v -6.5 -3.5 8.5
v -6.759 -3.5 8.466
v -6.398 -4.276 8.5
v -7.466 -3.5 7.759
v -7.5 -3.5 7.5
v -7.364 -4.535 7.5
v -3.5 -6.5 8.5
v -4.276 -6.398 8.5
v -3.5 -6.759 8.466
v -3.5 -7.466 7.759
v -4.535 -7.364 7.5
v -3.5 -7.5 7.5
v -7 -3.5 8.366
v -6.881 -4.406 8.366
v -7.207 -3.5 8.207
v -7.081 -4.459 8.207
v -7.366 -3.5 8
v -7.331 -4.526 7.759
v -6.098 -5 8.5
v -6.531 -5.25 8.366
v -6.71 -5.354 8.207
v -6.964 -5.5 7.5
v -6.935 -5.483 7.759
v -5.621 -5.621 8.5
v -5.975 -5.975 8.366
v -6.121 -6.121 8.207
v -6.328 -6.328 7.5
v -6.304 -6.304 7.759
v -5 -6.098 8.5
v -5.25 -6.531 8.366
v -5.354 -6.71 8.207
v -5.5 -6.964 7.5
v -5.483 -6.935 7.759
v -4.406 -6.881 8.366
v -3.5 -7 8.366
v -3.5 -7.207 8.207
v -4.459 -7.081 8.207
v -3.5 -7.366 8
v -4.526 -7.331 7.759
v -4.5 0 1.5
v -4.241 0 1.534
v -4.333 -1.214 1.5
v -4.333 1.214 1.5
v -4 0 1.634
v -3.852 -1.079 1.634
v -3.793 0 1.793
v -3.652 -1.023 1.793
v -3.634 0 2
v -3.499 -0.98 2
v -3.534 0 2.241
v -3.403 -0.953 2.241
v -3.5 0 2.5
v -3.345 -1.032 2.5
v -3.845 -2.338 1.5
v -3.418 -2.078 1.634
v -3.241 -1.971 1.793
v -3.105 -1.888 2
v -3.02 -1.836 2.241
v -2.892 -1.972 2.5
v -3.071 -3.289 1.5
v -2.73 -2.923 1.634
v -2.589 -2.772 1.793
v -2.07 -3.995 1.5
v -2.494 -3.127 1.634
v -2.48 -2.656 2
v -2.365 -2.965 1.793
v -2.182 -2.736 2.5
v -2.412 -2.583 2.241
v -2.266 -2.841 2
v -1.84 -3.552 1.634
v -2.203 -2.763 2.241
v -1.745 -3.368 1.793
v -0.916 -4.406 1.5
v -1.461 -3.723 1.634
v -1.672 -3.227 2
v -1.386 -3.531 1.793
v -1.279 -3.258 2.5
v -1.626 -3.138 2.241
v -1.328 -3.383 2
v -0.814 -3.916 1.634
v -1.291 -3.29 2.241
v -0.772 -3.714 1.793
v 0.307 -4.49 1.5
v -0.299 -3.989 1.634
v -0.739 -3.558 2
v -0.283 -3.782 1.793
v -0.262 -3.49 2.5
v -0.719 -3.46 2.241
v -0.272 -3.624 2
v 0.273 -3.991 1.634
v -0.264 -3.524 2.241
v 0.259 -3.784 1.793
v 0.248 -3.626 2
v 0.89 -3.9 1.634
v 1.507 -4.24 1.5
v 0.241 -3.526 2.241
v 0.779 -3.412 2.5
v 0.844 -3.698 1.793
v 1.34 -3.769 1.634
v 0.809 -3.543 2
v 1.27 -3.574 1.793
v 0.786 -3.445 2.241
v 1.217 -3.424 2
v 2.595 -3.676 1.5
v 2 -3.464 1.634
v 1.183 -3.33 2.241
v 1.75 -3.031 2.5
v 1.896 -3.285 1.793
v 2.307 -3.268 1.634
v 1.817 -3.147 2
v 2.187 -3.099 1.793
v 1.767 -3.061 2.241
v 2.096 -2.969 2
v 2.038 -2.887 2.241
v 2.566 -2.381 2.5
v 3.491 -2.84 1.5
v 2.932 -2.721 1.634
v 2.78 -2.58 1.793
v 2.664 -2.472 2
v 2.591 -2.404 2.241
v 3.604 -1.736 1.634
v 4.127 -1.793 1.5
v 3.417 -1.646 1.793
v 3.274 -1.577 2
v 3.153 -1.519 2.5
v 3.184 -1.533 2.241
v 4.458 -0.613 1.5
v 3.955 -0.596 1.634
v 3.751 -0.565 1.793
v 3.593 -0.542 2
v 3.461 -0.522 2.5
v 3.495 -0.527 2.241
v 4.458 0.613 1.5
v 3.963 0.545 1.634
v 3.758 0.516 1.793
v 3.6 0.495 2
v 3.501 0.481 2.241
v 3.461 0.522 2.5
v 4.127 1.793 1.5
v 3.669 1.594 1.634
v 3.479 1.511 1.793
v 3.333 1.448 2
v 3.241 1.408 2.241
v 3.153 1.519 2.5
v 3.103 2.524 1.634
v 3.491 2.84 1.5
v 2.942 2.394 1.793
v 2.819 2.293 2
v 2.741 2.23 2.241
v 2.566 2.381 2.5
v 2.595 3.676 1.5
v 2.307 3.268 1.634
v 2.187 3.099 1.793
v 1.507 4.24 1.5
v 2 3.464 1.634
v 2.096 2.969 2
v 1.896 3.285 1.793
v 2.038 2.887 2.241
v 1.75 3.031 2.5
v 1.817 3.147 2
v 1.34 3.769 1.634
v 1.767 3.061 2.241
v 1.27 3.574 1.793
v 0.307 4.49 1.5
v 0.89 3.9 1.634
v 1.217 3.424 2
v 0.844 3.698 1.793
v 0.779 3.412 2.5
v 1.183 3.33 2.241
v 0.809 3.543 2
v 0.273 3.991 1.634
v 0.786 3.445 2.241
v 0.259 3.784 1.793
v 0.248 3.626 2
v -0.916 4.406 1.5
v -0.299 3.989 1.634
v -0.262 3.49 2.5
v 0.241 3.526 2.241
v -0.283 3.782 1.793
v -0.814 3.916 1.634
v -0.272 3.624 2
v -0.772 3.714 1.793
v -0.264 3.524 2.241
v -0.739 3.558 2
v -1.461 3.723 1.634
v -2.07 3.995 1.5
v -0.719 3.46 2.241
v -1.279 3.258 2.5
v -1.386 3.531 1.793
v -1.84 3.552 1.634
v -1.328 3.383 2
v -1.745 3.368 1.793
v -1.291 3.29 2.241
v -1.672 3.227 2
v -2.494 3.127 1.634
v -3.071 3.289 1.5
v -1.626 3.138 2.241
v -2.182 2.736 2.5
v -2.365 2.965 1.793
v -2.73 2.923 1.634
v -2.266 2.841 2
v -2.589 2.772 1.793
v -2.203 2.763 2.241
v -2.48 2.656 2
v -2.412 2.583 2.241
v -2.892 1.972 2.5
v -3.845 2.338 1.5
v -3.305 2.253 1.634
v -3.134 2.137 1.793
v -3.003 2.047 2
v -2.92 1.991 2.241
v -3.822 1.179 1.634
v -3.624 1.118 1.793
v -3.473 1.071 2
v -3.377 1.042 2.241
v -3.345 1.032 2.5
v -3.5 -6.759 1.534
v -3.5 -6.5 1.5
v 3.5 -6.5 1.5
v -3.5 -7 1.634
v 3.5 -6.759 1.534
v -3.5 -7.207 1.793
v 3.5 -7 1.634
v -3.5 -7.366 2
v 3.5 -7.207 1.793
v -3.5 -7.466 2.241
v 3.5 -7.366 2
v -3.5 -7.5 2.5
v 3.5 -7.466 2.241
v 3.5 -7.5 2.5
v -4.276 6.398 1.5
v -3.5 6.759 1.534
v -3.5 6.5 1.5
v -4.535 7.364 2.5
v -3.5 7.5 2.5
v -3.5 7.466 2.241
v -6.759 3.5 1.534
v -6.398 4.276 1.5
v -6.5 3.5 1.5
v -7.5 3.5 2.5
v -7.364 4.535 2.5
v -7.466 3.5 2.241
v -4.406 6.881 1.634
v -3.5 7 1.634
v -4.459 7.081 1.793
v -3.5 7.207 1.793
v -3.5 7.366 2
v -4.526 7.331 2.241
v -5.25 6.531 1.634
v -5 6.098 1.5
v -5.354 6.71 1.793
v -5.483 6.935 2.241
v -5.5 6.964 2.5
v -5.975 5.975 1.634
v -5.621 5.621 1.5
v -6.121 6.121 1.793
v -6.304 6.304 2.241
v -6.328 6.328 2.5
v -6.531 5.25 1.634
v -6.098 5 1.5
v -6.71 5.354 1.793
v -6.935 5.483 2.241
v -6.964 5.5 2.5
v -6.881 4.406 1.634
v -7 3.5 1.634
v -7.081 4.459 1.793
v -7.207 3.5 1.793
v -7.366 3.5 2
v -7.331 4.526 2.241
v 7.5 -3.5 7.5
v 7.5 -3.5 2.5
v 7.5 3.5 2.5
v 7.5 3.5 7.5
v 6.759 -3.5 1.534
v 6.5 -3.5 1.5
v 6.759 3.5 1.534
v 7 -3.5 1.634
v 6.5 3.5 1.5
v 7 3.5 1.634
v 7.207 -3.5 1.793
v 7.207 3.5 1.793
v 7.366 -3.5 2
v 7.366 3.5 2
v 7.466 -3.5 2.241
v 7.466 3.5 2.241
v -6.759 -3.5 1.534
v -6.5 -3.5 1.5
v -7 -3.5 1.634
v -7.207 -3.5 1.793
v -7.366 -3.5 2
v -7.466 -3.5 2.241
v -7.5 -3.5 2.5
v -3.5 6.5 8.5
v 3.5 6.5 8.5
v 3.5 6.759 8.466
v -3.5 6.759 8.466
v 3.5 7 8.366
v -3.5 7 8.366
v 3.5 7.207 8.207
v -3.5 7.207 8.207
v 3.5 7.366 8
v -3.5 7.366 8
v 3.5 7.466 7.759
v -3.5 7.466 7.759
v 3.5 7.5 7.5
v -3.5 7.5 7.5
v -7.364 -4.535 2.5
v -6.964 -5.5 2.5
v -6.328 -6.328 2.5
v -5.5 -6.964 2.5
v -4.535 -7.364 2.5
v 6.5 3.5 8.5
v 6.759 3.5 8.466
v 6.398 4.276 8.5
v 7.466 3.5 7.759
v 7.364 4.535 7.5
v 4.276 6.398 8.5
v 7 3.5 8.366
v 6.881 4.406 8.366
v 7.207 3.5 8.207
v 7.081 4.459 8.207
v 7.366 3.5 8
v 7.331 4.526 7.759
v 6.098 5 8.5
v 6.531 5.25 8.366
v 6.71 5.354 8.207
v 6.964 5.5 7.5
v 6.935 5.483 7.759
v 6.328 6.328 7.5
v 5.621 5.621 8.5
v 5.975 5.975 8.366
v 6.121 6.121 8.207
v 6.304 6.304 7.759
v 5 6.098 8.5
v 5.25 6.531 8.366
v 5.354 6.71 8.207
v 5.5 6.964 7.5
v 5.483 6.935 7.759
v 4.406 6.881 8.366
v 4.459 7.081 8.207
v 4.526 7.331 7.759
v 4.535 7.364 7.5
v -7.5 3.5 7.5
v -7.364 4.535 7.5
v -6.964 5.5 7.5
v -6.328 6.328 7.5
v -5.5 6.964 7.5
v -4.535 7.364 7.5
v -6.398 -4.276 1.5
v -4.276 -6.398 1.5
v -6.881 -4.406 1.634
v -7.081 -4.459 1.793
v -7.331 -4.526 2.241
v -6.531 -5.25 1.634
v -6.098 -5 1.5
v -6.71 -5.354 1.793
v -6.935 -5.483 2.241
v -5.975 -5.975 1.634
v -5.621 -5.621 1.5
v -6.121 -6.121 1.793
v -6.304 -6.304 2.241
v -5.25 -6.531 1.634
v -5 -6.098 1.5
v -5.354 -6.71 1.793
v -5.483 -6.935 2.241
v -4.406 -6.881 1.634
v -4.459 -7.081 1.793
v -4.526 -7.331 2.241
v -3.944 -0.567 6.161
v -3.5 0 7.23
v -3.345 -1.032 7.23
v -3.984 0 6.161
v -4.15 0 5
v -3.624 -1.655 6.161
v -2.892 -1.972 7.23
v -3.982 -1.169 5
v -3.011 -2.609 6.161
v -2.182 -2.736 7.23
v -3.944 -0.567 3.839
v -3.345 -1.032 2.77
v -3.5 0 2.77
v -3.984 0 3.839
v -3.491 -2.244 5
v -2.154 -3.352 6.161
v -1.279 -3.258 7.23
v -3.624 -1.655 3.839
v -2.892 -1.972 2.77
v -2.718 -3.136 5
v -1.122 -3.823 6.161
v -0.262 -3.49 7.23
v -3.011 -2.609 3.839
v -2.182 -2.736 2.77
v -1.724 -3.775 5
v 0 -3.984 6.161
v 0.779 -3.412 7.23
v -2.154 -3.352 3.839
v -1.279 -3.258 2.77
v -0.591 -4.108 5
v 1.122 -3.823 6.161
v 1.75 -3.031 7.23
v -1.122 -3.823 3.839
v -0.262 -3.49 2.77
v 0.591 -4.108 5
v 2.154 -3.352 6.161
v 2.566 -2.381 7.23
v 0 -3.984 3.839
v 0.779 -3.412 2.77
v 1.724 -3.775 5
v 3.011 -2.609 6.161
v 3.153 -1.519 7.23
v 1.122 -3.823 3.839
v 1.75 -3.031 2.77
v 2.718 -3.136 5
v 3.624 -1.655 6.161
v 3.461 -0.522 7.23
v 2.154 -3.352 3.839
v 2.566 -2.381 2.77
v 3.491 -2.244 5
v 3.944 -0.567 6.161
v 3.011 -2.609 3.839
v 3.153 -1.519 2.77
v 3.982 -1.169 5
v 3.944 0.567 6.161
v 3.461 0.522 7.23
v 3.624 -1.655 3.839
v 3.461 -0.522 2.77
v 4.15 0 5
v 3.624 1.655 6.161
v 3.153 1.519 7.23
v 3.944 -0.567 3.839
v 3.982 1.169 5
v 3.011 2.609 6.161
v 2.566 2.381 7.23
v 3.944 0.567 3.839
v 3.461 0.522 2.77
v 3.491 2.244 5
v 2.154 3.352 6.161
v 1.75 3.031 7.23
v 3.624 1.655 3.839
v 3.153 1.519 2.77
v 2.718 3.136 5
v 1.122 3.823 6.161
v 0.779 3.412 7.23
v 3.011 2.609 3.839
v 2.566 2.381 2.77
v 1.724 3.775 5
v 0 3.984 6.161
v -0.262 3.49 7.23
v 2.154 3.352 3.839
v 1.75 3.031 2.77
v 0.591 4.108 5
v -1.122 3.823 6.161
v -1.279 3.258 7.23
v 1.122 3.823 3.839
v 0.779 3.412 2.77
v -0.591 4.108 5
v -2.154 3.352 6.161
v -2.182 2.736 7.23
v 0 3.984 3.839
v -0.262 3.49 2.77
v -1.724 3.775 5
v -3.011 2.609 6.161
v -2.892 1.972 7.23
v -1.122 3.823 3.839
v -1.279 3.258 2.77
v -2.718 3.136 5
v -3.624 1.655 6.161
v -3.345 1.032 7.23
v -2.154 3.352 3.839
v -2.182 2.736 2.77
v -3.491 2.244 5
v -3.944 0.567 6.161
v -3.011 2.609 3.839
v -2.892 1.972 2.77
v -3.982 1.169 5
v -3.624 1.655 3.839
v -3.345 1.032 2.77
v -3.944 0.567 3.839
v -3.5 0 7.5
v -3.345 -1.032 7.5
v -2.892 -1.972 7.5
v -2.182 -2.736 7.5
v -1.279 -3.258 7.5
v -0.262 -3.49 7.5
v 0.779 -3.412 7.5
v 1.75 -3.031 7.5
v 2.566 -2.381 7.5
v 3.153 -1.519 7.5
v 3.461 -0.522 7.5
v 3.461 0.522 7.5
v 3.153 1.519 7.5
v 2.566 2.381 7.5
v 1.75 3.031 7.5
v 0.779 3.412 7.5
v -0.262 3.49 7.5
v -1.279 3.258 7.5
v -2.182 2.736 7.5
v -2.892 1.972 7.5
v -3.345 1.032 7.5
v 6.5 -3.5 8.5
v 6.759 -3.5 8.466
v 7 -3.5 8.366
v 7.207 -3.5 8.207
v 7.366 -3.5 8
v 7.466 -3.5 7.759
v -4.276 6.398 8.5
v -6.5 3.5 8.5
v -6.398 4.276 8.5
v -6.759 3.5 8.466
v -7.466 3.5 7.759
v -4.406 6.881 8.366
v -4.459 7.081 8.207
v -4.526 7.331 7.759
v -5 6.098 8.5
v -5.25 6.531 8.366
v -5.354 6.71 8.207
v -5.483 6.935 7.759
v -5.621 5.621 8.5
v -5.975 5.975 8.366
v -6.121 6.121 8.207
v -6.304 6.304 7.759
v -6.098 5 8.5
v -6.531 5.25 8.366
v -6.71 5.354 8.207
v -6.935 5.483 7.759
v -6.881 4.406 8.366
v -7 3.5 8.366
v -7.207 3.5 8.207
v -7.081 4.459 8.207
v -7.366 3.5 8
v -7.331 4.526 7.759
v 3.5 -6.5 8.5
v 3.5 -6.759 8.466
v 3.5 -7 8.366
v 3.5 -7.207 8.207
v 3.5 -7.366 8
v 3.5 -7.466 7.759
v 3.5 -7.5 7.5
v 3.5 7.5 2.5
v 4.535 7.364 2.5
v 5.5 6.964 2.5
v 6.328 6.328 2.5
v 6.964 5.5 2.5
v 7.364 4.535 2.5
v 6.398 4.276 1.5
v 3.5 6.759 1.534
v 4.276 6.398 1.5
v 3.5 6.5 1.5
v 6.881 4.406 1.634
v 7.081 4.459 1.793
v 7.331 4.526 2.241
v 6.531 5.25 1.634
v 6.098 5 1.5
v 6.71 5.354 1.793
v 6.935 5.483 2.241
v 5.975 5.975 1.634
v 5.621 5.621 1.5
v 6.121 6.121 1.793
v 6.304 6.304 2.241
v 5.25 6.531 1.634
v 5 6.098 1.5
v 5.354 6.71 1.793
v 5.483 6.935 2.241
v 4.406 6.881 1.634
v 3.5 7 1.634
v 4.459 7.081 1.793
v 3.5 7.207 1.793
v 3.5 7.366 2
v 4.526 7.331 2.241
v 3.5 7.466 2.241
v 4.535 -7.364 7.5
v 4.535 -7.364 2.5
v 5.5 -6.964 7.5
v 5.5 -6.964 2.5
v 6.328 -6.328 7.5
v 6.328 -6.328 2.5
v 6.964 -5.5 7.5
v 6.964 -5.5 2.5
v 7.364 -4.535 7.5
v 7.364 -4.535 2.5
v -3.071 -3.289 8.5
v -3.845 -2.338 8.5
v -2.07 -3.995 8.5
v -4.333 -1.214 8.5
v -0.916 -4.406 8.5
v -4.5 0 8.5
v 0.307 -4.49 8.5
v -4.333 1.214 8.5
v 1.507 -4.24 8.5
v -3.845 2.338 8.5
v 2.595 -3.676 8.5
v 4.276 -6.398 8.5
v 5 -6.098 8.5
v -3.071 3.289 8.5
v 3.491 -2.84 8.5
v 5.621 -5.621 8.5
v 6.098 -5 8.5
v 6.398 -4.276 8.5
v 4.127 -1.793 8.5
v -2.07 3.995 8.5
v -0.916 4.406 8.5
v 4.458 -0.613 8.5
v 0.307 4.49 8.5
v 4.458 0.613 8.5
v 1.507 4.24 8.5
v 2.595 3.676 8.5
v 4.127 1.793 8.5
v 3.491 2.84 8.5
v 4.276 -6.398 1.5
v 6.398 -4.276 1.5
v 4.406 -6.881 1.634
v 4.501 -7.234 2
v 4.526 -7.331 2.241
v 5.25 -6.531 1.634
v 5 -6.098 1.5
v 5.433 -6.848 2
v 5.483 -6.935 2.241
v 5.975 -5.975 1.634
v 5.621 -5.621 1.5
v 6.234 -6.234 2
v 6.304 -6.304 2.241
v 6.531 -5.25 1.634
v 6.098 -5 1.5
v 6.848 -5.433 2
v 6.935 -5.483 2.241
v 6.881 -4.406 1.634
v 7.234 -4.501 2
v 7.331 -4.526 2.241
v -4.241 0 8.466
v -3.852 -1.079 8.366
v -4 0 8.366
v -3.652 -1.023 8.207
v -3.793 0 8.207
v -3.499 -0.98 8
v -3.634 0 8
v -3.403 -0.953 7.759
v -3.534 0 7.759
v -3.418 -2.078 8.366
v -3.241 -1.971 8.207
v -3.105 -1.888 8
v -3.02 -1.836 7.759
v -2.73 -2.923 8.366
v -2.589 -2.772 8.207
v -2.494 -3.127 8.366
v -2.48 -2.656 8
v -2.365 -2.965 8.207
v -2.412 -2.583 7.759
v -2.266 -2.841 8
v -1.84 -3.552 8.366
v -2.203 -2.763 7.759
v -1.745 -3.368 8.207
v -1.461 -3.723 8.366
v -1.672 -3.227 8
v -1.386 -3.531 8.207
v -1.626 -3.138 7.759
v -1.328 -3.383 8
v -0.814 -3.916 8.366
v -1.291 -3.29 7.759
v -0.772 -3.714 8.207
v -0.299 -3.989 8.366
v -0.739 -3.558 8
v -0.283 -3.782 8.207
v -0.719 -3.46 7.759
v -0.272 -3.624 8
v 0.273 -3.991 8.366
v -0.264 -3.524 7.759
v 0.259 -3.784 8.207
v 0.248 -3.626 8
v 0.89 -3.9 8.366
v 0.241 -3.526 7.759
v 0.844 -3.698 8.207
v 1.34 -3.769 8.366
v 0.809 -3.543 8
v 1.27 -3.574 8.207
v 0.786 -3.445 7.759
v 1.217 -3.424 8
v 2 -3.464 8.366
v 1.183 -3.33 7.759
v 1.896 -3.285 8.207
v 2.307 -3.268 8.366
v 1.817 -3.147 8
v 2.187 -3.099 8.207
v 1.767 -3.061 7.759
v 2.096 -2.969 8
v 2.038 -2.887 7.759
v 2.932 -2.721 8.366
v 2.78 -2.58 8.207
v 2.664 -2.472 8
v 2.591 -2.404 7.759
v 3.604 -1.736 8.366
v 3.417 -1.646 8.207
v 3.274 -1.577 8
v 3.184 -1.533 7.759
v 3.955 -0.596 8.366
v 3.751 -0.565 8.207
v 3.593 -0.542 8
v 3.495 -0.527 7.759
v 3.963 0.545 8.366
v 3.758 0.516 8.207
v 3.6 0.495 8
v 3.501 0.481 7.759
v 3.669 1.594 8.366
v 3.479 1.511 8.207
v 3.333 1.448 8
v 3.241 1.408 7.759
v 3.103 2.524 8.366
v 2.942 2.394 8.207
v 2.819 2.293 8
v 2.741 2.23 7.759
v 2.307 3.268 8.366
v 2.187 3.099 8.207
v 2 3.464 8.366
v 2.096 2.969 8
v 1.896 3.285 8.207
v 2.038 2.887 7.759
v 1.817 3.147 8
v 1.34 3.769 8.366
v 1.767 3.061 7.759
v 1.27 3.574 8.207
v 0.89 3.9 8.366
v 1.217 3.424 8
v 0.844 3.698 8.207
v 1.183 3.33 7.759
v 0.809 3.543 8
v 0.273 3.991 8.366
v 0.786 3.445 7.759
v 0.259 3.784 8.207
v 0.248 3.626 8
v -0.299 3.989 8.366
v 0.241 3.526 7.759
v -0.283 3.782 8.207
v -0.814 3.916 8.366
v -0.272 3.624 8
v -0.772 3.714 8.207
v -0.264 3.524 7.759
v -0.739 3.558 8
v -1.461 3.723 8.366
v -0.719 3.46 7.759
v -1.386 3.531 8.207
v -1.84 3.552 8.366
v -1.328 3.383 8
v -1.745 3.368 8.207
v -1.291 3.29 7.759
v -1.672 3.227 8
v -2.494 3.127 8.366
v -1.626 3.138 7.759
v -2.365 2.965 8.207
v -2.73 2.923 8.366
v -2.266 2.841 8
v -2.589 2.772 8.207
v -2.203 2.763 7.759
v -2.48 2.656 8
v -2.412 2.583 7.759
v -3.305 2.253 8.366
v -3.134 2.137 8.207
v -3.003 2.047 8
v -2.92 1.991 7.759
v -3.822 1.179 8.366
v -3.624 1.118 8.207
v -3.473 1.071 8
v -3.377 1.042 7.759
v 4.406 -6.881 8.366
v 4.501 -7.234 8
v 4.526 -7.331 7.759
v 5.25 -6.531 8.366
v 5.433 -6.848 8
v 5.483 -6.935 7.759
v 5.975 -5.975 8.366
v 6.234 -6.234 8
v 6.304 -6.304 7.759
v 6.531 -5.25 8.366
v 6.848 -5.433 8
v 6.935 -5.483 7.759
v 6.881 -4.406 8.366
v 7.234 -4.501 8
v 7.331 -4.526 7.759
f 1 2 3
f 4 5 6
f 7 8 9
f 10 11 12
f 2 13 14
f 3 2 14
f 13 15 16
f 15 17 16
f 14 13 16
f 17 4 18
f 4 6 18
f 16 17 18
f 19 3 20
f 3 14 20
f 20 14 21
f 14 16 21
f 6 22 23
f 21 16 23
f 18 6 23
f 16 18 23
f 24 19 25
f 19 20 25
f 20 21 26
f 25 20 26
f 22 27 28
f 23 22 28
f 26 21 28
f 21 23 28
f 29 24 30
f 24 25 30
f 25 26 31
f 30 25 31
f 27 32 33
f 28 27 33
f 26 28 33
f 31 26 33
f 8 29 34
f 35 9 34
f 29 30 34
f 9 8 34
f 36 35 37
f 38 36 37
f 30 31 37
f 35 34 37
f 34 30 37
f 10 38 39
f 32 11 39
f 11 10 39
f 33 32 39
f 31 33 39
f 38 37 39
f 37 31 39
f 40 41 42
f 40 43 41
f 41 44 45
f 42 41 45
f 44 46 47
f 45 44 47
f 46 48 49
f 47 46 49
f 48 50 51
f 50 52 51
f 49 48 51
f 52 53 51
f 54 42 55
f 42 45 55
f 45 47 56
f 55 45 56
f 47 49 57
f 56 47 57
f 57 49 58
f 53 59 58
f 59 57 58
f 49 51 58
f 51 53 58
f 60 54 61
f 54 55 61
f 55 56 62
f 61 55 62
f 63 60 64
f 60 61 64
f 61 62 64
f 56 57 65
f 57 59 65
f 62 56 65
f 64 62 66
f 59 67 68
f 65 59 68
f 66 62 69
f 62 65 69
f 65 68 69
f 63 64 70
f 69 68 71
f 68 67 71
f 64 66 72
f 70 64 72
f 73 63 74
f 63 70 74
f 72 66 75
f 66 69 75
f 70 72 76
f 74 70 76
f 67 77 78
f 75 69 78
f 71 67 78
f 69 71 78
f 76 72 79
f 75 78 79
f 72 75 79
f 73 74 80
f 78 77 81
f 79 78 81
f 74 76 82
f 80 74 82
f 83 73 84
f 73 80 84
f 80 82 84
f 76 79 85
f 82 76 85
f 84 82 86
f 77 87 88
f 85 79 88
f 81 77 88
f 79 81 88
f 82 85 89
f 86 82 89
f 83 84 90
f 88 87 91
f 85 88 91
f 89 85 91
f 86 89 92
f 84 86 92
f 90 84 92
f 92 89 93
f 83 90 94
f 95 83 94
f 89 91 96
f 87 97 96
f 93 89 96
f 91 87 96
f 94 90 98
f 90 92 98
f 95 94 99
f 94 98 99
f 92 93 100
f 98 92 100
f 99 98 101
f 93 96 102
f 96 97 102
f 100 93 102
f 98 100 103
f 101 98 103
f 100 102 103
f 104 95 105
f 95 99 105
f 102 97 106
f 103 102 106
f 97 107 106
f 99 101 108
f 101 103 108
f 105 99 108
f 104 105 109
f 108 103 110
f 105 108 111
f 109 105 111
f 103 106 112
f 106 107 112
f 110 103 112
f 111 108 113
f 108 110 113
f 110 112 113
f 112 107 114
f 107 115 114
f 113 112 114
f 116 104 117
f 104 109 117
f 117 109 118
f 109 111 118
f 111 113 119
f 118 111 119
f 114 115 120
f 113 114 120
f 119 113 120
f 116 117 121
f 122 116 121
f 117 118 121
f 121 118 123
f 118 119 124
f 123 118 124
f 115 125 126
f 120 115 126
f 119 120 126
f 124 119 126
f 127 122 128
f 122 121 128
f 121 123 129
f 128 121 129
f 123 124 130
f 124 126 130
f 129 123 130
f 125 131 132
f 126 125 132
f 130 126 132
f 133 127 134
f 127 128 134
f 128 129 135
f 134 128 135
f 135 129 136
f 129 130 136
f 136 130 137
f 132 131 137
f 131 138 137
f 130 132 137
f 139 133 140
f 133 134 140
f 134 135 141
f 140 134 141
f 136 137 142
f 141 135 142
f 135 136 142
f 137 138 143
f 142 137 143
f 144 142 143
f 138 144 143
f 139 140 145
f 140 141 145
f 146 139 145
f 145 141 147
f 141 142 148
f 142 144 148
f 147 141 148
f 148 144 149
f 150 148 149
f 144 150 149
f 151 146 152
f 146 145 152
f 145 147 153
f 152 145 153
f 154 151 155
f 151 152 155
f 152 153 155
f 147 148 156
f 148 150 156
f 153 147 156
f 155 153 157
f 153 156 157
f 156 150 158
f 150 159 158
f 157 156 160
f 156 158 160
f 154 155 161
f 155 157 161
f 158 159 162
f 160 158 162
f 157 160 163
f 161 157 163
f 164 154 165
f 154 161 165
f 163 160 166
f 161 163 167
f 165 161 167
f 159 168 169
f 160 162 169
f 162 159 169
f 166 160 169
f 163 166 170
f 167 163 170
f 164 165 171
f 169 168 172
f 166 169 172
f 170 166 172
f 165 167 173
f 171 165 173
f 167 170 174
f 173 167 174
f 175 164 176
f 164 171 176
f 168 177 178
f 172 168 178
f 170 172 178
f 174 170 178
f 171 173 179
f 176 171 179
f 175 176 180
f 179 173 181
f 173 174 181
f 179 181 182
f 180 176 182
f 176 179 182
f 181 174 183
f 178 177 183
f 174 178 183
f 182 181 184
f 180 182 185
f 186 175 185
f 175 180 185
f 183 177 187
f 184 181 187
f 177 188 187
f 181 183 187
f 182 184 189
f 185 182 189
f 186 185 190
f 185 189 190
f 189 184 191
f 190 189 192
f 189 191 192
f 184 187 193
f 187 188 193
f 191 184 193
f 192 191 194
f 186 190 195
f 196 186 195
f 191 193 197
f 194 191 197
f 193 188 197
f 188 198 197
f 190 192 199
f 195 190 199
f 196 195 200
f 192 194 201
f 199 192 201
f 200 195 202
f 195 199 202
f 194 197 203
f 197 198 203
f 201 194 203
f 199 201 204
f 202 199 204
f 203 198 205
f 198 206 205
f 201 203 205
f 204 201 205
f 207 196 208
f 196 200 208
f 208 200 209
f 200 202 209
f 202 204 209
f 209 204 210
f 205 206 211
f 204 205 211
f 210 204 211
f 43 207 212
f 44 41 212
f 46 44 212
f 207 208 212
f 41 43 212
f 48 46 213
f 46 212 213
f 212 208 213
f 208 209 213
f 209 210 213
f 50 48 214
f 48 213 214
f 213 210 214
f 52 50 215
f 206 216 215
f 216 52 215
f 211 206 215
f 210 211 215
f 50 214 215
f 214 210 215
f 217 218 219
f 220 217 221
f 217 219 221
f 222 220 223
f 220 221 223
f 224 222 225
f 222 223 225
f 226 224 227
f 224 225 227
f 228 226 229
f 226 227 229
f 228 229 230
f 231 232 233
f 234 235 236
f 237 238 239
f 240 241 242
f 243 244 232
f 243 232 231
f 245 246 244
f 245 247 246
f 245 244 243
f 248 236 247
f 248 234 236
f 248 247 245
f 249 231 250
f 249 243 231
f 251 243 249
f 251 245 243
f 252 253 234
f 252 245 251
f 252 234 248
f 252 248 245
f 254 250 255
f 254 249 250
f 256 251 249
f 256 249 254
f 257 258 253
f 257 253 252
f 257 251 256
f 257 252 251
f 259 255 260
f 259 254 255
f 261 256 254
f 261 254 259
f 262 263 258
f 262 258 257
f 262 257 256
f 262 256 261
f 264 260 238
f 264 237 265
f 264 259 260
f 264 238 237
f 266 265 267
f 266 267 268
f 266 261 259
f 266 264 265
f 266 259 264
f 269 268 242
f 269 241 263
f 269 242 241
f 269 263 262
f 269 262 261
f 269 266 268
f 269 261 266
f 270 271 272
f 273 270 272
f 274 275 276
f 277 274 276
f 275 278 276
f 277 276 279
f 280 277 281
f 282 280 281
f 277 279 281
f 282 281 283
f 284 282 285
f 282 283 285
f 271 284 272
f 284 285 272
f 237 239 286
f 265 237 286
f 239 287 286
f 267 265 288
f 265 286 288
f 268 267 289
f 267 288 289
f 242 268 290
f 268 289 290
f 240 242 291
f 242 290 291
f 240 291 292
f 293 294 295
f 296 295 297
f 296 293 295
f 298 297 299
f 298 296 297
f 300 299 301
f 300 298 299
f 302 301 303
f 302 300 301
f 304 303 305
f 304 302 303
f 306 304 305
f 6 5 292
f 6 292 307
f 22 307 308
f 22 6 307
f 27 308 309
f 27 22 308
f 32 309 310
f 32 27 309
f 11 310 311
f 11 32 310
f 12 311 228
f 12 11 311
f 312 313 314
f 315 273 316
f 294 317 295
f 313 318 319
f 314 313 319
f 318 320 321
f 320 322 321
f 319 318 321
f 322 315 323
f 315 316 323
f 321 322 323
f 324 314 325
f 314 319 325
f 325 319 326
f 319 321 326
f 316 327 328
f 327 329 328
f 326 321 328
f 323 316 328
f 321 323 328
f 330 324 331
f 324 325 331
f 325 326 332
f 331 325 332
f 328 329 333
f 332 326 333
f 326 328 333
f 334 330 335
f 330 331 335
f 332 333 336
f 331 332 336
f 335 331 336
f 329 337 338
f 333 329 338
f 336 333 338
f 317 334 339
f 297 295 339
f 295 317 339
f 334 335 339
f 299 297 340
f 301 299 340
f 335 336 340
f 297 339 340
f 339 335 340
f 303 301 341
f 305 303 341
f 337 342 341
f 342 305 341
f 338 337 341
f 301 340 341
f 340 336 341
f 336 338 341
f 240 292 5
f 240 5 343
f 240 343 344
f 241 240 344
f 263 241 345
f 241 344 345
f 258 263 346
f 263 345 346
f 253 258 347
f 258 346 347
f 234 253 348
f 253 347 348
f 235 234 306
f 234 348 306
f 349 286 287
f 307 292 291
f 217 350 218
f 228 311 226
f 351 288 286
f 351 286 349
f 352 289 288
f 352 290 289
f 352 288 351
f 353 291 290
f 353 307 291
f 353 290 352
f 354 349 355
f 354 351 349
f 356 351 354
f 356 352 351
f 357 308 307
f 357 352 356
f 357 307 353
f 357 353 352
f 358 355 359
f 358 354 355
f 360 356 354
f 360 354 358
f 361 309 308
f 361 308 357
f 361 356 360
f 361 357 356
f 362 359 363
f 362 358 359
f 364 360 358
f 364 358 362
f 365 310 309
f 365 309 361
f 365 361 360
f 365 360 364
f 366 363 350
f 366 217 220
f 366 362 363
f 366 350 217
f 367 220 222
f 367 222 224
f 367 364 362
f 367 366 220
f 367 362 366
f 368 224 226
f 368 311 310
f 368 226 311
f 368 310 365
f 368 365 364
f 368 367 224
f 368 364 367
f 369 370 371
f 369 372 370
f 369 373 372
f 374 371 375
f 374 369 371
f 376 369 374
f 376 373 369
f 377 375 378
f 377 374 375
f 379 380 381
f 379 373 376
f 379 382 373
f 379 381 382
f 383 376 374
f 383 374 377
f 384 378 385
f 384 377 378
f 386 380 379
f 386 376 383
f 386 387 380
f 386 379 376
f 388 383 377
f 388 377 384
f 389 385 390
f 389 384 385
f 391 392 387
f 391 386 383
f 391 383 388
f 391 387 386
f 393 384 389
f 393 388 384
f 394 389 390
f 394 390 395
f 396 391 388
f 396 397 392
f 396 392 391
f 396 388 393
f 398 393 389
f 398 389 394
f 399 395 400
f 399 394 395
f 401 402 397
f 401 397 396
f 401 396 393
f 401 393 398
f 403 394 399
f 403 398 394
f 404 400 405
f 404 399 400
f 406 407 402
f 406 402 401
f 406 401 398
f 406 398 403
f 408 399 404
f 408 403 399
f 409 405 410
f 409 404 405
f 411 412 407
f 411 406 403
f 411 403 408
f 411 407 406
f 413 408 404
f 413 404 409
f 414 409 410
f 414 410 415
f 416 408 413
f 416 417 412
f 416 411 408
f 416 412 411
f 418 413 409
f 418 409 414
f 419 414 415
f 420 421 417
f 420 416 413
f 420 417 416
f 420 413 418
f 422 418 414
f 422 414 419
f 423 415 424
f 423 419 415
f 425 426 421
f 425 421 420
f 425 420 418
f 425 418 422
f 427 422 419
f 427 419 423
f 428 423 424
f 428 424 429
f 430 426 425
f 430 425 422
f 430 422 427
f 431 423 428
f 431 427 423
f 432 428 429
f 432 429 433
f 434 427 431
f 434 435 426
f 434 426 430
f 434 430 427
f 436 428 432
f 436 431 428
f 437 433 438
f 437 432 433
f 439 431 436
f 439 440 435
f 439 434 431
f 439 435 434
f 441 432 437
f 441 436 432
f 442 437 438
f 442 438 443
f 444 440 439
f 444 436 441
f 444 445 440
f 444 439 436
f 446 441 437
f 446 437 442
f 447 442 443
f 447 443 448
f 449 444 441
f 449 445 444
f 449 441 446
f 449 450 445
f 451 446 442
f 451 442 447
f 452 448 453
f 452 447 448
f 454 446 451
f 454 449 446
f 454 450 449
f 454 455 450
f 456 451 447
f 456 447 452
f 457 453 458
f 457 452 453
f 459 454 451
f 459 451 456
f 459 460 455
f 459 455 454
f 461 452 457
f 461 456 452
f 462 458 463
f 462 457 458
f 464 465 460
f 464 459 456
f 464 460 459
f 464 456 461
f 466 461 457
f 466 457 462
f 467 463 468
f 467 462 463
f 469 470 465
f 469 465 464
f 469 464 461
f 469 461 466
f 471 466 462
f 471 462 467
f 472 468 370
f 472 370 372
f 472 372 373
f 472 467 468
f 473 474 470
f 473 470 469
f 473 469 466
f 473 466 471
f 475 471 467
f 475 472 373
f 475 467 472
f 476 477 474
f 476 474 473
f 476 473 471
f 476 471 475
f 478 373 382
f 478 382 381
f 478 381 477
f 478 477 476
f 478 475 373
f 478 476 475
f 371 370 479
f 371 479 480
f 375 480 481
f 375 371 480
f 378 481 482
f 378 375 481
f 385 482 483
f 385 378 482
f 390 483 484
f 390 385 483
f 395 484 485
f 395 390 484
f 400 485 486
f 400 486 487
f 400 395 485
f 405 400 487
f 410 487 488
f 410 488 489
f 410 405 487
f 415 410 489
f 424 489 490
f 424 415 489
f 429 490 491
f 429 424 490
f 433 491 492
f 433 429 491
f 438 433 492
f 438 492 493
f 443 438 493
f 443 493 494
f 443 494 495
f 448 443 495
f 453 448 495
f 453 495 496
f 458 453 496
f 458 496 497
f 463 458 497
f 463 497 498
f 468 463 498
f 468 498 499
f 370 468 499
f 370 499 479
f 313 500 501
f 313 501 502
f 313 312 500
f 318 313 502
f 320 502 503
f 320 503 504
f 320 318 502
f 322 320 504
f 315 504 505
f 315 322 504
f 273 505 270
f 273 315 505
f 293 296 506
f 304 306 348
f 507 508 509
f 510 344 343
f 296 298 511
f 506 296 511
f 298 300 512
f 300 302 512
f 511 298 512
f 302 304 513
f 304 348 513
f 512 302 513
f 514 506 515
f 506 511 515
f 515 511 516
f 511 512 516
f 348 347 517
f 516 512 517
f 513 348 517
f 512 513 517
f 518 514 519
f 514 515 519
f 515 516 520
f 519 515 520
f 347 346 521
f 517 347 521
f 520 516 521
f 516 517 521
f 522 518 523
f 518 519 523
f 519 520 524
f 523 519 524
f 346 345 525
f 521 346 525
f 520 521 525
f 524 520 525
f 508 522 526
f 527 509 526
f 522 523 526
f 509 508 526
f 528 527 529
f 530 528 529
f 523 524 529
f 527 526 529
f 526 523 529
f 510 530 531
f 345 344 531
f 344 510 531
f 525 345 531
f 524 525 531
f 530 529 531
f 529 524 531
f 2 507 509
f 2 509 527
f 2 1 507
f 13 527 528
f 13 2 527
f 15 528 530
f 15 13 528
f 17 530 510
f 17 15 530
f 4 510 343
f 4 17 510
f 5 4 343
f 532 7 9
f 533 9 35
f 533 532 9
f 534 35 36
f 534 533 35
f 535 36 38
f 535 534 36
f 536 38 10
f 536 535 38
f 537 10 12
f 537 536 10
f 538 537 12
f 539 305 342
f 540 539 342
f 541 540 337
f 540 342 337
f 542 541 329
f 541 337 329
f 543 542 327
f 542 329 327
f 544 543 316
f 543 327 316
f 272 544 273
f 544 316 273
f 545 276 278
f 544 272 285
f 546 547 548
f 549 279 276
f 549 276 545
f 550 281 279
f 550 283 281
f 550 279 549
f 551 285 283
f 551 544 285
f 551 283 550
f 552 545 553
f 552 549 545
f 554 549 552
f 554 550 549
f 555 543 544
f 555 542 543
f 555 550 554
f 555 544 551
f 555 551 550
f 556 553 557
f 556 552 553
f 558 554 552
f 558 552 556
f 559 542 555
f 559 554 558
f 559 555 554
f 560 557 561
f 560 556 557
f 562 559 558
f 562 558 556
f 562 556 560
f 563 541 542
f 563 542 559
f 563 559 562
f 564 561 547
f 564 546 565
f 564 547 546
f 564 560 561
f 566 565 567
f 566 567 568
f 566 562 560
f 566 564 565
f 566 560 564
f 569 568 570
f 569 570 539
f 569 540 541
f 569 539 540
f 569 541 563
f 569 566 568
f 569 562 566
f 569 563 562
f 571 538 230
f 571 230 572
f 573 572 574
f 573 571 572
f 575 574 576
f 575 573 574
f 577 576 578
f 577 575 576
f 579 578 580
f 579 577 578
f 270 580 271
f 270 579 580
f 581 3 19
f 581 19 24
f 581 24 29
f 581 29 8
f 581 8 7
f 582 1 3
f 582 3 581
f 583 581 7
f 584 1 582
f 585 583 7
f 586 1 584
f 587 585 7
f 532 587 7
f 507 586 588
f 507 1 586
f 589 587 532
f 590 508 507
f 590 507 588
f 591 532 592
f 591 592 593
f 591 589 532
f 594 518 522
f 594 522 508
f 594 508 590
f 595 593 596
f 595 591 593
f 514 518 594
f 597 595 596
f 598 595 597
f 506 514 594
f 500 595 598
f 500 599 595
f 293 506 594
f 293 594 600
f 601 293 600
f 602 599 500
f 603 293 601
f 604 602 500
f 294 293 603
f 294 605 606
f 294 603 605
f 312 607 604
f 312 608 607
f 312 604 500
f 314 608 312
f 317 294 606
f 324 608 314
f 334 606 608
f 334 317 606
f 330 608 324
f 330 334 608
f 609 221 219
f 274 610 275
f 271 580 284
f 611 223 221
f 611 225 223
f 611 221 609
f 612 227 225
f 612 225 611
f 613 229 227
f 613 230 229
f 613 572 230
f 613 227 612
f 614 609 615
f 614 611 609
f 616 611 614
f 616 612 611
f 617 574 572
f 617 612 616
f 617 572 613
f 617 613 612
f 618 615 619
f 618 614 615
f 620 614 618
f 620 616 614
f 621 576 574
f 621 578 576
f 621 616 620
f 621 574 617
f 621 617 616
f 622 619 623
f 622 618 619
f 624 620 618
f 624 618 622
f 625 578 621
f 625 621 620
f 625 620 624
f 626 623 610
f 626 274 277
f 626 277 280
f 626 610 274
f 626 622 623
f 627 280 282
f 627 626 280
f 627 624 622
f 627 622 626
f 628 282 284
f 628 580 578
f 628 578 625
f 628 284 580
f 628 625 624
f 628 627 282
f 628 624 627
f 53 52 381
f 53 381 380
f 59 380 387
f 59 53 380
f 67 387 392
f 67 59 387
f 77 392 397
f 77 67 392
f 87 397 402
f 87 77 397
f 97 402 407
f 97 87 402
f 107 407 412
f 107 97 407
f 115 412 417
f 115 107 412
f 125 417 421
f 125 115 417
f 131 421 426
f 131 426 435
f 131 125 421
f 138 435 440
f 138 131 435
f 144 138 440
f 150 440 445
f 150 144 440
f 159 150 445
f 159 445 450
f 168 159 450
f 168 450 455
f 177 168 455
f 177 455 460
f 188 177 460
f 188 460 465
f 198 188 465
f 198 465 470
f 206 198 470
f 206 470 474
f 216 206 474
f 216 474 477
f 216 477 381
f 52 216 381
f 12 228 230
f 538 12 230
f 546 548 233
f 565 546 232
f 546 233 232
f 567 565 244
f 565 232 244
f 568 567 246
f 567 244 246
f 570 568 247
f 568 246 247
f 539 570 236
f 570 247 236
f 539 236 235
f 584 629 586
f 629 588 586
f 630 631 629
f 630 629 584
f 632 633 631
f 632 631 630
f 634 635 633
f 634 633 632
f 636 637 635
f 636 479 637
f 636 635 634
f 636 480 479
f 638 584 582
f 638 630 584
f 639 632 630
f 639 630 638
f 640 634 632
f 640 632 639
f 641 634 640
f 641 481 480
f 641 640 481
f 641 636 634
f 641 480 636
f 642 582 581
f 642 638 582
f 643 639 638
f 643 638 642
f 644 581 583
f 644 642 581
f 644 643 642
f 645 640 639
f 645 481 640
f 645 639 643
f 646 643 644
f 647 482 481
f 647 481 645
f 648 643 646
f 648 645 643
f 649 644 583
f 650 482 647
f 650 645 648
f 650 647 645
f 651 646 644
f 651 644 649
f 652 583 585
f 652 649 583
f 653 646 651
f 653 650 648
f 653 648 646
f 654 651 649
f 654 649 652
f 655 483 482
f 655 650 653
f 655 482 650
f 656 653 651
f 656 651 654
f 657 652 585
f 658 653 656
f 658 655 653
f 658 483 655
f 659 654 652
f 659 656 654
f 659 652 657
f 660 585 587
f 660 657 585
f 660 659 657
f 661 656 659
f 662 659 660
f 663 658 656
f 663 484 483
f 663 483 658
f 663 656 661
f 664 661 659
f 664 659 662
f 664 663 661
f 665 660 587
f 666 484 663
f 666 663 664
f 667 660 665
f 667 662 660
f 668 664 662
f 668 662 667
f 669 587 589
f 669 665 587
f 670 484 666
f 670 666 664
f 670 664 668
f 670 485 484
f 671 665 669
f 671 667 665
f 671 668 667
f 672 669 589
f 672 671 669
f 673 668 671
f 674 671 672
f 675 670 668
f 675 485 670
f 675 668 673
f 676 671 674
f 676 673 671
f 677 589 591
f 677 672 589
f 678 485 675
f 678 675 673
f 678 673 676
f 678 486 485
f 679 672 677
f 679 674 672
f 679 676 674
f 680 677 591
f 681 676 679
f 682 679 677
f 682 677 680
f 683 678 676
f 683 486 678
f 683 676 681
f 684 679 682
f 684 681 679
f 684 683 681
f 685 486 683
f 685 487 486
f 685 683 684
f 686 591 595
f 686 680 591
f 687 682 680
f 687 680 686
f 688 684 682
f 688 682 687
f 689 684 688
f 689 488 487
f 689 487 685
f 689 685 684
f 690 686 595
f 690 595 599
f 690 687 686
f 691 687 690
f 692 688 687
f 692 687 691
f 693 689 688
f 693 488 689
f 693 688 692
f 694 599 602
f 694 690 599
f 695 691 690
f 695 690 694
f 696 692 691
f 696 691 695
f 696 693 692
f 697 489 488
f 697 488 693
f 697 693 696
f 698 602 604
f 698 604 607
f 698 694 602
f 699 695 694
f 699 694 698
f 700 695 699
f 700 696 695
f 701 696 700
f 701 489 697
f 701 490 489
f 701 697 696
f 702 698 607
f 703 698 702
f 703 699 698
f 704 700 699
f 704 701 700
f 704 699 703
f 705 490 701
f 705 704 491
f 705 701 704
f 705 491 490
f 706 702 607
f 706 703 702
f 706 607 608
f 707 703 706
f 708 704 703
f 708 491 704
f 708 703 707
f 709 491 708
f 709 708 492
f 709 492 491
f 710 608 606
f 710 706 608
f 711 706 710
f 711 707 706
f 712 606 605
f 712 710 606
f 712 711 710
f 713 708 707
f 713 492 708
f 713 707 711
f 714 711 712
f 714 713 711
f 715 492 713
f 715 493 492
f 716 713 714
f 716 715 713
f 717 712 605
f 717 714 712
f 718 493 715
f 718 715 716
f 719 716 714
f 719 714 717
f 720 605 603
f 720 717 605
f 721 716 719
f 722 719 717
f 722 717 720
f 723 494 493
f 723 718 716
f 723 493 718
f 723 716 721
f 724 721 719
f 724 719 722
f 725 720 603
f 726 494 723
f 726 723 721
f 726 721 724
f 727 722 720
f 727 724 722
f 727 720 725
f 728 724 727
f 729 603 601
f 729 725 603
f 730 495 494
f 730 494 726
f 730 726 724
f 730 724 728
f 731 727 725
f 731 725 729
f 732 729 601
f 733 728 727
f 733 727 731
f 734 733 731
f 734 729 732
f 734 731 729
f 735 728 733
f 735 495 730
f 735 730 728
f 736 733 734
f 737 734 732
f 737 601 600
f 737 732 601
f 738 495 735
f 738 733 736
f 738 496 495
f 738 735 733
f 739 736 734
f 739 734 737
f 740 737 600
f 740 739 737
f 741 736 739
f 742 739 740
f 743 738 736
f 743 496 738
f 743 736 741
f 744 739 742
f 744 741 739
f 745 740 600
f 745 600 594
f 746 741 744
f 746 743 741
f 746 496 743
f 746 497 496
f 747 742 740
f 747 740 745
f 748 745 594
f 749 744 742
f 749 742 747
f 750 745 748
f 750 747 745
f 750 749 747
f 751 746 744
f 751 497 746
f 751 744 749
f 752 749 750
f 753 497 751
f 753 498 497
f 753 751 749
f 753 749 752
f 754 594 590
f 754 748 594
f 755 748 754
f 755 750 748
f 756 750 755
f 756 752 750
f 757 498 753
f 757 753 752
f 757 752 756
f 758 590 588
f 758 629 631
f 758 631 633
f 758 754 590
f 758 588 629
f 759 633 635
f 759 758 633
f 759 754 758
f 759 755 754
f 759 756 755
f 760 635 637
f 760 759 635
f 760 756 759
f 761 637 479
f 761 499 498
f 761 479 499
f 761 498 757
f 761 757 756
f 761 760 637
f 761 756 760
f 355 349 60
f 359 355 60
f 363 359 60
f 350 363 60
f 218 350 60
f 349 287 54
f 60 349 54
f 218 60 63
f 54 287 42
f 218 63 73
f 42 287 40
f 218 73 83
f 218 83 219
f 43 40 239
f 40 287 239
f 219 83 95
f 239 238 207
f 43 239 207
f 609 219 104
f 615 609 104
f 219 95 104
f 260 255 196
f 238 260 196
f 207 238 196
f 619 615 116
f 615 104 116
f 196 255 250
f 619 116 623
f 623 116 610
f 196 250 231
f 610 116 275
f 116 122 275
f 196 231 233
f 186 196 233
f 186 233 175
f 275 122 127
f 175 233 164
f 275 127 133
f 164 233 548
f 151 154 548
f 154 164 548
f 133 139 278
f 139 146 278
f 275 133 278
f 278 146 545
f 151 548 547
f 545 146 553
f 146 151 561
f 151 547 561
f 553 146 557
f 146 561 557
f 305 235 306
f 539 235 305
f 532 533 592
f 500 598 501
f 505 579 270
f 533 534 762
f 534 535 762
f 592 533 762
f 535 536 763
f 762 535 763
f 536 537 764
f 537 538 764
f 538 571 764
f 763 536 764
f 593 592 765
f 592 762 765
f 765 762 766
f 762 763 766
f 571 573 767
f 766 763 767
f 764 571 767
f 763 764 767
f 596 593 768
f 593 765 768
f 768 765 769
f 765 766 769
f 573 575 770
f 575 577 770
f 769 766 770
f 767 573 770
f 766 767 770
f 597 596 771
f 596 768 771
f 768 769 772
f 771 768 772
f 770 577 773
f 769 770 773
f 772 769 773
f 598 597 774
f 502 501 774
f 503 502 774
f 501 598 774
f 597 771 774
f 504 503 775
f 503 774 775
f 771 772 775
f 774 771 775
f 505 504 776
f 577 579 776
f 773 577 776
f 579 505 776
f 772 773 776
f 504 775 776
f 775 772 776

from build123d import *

# Parameters (mm, degrees)
BOSS_EXTRUDE1_DEPTH      = 3.5
BOSS_EXTRUDE1_DEPTH_BACK = 3.5
SKETCH1_W                = 15
SKETCH1_H                = 15
SKETCH1_R                = 3.5
FILLET1_R                = 4
FILLET2_R                = 1


with BuildPart() as part:
    # Sketch1 → Boss-Extrude1 (new, two sides: drawn at the far end of the back side and taken through both)
    with BuildSketch(Plane.XY.offset(5).offset(-BOSS_EXTRUDE1_DEPTH_BACK)):
        Rectangle(SKETCH1_W, SKETCH1_H)
        Circle(SKETCH1_R, mode=Mode.SUBTRACT)
    extrude(amount=BOSS_EXTRUDE1_DEPTH + BOSS_EXTRUDE1_DEPTH_BACK)

    # Sketch2 → Cut-Revolve1 (revolve, cut)
    with BuildSketch(Plane(origin=(0, 0, 0), x_dir=(1, 0, 0), z_dir=(0, 1, 0))):
        with BuildLine():
            Line((3.5, -2.770089688), (3.5, -7.229910312))
            ThreePointArc((3.5, -7.229910312), (4.15, -5), (3.5, -2.770089688))
        make_face()
    revolve(axis=Axis((0, 0, 1.5), (0, 0, 1)), mode=Mode.SUBTRACT)

    # Fillet1
    fillet1_edges = [part.edges().sort_by_distance(p)[0] for p in [
        (-7.5, 7.5, 5),
        (-7.5, -7.5, 5),
        (7.5, 7.5, 5),
        (7.5, -7.5, 5),
    ]]
    fillet(fillet1_edges, radius=FILLET1_R)

    # Fillet2
    fillet2_edges = [part.edges().sort_by_distance(p)[0] for p in [
        (-3.5, 0, 8.5),
        (-6.328427125, -6.328427125, 8.5),
        (-7.5, 0, 8.5),
        (-6.328427125, 6.328427125, 8.5),
        (0, 7.5, 8.5),
        (6.328427125, 6.328427125, 8.5),
        (7.5, 0, 8.5),
        (6.328427125, -6.328427125, 8.5),
        (0, -7.5, 8.5),
        (6.328427125, 6.328427125, 1.5),
        (0, 7.5, 1.5),
        (-6.328427125, 6.328427125, 1.5),
        (-7.5, 0, 1.5),
        (-6.328427125, -6.328427125, 1.5),
        (0, -7.5, 1.5),
        (6.328427125, -6.328427125, 1.5),
        (7.5, 0, 1.5),
        (-3.5, 0, 1.5),
    ]]
    fillet(fillet2_edges, radius=FILLET2_R)


solid = part.part
